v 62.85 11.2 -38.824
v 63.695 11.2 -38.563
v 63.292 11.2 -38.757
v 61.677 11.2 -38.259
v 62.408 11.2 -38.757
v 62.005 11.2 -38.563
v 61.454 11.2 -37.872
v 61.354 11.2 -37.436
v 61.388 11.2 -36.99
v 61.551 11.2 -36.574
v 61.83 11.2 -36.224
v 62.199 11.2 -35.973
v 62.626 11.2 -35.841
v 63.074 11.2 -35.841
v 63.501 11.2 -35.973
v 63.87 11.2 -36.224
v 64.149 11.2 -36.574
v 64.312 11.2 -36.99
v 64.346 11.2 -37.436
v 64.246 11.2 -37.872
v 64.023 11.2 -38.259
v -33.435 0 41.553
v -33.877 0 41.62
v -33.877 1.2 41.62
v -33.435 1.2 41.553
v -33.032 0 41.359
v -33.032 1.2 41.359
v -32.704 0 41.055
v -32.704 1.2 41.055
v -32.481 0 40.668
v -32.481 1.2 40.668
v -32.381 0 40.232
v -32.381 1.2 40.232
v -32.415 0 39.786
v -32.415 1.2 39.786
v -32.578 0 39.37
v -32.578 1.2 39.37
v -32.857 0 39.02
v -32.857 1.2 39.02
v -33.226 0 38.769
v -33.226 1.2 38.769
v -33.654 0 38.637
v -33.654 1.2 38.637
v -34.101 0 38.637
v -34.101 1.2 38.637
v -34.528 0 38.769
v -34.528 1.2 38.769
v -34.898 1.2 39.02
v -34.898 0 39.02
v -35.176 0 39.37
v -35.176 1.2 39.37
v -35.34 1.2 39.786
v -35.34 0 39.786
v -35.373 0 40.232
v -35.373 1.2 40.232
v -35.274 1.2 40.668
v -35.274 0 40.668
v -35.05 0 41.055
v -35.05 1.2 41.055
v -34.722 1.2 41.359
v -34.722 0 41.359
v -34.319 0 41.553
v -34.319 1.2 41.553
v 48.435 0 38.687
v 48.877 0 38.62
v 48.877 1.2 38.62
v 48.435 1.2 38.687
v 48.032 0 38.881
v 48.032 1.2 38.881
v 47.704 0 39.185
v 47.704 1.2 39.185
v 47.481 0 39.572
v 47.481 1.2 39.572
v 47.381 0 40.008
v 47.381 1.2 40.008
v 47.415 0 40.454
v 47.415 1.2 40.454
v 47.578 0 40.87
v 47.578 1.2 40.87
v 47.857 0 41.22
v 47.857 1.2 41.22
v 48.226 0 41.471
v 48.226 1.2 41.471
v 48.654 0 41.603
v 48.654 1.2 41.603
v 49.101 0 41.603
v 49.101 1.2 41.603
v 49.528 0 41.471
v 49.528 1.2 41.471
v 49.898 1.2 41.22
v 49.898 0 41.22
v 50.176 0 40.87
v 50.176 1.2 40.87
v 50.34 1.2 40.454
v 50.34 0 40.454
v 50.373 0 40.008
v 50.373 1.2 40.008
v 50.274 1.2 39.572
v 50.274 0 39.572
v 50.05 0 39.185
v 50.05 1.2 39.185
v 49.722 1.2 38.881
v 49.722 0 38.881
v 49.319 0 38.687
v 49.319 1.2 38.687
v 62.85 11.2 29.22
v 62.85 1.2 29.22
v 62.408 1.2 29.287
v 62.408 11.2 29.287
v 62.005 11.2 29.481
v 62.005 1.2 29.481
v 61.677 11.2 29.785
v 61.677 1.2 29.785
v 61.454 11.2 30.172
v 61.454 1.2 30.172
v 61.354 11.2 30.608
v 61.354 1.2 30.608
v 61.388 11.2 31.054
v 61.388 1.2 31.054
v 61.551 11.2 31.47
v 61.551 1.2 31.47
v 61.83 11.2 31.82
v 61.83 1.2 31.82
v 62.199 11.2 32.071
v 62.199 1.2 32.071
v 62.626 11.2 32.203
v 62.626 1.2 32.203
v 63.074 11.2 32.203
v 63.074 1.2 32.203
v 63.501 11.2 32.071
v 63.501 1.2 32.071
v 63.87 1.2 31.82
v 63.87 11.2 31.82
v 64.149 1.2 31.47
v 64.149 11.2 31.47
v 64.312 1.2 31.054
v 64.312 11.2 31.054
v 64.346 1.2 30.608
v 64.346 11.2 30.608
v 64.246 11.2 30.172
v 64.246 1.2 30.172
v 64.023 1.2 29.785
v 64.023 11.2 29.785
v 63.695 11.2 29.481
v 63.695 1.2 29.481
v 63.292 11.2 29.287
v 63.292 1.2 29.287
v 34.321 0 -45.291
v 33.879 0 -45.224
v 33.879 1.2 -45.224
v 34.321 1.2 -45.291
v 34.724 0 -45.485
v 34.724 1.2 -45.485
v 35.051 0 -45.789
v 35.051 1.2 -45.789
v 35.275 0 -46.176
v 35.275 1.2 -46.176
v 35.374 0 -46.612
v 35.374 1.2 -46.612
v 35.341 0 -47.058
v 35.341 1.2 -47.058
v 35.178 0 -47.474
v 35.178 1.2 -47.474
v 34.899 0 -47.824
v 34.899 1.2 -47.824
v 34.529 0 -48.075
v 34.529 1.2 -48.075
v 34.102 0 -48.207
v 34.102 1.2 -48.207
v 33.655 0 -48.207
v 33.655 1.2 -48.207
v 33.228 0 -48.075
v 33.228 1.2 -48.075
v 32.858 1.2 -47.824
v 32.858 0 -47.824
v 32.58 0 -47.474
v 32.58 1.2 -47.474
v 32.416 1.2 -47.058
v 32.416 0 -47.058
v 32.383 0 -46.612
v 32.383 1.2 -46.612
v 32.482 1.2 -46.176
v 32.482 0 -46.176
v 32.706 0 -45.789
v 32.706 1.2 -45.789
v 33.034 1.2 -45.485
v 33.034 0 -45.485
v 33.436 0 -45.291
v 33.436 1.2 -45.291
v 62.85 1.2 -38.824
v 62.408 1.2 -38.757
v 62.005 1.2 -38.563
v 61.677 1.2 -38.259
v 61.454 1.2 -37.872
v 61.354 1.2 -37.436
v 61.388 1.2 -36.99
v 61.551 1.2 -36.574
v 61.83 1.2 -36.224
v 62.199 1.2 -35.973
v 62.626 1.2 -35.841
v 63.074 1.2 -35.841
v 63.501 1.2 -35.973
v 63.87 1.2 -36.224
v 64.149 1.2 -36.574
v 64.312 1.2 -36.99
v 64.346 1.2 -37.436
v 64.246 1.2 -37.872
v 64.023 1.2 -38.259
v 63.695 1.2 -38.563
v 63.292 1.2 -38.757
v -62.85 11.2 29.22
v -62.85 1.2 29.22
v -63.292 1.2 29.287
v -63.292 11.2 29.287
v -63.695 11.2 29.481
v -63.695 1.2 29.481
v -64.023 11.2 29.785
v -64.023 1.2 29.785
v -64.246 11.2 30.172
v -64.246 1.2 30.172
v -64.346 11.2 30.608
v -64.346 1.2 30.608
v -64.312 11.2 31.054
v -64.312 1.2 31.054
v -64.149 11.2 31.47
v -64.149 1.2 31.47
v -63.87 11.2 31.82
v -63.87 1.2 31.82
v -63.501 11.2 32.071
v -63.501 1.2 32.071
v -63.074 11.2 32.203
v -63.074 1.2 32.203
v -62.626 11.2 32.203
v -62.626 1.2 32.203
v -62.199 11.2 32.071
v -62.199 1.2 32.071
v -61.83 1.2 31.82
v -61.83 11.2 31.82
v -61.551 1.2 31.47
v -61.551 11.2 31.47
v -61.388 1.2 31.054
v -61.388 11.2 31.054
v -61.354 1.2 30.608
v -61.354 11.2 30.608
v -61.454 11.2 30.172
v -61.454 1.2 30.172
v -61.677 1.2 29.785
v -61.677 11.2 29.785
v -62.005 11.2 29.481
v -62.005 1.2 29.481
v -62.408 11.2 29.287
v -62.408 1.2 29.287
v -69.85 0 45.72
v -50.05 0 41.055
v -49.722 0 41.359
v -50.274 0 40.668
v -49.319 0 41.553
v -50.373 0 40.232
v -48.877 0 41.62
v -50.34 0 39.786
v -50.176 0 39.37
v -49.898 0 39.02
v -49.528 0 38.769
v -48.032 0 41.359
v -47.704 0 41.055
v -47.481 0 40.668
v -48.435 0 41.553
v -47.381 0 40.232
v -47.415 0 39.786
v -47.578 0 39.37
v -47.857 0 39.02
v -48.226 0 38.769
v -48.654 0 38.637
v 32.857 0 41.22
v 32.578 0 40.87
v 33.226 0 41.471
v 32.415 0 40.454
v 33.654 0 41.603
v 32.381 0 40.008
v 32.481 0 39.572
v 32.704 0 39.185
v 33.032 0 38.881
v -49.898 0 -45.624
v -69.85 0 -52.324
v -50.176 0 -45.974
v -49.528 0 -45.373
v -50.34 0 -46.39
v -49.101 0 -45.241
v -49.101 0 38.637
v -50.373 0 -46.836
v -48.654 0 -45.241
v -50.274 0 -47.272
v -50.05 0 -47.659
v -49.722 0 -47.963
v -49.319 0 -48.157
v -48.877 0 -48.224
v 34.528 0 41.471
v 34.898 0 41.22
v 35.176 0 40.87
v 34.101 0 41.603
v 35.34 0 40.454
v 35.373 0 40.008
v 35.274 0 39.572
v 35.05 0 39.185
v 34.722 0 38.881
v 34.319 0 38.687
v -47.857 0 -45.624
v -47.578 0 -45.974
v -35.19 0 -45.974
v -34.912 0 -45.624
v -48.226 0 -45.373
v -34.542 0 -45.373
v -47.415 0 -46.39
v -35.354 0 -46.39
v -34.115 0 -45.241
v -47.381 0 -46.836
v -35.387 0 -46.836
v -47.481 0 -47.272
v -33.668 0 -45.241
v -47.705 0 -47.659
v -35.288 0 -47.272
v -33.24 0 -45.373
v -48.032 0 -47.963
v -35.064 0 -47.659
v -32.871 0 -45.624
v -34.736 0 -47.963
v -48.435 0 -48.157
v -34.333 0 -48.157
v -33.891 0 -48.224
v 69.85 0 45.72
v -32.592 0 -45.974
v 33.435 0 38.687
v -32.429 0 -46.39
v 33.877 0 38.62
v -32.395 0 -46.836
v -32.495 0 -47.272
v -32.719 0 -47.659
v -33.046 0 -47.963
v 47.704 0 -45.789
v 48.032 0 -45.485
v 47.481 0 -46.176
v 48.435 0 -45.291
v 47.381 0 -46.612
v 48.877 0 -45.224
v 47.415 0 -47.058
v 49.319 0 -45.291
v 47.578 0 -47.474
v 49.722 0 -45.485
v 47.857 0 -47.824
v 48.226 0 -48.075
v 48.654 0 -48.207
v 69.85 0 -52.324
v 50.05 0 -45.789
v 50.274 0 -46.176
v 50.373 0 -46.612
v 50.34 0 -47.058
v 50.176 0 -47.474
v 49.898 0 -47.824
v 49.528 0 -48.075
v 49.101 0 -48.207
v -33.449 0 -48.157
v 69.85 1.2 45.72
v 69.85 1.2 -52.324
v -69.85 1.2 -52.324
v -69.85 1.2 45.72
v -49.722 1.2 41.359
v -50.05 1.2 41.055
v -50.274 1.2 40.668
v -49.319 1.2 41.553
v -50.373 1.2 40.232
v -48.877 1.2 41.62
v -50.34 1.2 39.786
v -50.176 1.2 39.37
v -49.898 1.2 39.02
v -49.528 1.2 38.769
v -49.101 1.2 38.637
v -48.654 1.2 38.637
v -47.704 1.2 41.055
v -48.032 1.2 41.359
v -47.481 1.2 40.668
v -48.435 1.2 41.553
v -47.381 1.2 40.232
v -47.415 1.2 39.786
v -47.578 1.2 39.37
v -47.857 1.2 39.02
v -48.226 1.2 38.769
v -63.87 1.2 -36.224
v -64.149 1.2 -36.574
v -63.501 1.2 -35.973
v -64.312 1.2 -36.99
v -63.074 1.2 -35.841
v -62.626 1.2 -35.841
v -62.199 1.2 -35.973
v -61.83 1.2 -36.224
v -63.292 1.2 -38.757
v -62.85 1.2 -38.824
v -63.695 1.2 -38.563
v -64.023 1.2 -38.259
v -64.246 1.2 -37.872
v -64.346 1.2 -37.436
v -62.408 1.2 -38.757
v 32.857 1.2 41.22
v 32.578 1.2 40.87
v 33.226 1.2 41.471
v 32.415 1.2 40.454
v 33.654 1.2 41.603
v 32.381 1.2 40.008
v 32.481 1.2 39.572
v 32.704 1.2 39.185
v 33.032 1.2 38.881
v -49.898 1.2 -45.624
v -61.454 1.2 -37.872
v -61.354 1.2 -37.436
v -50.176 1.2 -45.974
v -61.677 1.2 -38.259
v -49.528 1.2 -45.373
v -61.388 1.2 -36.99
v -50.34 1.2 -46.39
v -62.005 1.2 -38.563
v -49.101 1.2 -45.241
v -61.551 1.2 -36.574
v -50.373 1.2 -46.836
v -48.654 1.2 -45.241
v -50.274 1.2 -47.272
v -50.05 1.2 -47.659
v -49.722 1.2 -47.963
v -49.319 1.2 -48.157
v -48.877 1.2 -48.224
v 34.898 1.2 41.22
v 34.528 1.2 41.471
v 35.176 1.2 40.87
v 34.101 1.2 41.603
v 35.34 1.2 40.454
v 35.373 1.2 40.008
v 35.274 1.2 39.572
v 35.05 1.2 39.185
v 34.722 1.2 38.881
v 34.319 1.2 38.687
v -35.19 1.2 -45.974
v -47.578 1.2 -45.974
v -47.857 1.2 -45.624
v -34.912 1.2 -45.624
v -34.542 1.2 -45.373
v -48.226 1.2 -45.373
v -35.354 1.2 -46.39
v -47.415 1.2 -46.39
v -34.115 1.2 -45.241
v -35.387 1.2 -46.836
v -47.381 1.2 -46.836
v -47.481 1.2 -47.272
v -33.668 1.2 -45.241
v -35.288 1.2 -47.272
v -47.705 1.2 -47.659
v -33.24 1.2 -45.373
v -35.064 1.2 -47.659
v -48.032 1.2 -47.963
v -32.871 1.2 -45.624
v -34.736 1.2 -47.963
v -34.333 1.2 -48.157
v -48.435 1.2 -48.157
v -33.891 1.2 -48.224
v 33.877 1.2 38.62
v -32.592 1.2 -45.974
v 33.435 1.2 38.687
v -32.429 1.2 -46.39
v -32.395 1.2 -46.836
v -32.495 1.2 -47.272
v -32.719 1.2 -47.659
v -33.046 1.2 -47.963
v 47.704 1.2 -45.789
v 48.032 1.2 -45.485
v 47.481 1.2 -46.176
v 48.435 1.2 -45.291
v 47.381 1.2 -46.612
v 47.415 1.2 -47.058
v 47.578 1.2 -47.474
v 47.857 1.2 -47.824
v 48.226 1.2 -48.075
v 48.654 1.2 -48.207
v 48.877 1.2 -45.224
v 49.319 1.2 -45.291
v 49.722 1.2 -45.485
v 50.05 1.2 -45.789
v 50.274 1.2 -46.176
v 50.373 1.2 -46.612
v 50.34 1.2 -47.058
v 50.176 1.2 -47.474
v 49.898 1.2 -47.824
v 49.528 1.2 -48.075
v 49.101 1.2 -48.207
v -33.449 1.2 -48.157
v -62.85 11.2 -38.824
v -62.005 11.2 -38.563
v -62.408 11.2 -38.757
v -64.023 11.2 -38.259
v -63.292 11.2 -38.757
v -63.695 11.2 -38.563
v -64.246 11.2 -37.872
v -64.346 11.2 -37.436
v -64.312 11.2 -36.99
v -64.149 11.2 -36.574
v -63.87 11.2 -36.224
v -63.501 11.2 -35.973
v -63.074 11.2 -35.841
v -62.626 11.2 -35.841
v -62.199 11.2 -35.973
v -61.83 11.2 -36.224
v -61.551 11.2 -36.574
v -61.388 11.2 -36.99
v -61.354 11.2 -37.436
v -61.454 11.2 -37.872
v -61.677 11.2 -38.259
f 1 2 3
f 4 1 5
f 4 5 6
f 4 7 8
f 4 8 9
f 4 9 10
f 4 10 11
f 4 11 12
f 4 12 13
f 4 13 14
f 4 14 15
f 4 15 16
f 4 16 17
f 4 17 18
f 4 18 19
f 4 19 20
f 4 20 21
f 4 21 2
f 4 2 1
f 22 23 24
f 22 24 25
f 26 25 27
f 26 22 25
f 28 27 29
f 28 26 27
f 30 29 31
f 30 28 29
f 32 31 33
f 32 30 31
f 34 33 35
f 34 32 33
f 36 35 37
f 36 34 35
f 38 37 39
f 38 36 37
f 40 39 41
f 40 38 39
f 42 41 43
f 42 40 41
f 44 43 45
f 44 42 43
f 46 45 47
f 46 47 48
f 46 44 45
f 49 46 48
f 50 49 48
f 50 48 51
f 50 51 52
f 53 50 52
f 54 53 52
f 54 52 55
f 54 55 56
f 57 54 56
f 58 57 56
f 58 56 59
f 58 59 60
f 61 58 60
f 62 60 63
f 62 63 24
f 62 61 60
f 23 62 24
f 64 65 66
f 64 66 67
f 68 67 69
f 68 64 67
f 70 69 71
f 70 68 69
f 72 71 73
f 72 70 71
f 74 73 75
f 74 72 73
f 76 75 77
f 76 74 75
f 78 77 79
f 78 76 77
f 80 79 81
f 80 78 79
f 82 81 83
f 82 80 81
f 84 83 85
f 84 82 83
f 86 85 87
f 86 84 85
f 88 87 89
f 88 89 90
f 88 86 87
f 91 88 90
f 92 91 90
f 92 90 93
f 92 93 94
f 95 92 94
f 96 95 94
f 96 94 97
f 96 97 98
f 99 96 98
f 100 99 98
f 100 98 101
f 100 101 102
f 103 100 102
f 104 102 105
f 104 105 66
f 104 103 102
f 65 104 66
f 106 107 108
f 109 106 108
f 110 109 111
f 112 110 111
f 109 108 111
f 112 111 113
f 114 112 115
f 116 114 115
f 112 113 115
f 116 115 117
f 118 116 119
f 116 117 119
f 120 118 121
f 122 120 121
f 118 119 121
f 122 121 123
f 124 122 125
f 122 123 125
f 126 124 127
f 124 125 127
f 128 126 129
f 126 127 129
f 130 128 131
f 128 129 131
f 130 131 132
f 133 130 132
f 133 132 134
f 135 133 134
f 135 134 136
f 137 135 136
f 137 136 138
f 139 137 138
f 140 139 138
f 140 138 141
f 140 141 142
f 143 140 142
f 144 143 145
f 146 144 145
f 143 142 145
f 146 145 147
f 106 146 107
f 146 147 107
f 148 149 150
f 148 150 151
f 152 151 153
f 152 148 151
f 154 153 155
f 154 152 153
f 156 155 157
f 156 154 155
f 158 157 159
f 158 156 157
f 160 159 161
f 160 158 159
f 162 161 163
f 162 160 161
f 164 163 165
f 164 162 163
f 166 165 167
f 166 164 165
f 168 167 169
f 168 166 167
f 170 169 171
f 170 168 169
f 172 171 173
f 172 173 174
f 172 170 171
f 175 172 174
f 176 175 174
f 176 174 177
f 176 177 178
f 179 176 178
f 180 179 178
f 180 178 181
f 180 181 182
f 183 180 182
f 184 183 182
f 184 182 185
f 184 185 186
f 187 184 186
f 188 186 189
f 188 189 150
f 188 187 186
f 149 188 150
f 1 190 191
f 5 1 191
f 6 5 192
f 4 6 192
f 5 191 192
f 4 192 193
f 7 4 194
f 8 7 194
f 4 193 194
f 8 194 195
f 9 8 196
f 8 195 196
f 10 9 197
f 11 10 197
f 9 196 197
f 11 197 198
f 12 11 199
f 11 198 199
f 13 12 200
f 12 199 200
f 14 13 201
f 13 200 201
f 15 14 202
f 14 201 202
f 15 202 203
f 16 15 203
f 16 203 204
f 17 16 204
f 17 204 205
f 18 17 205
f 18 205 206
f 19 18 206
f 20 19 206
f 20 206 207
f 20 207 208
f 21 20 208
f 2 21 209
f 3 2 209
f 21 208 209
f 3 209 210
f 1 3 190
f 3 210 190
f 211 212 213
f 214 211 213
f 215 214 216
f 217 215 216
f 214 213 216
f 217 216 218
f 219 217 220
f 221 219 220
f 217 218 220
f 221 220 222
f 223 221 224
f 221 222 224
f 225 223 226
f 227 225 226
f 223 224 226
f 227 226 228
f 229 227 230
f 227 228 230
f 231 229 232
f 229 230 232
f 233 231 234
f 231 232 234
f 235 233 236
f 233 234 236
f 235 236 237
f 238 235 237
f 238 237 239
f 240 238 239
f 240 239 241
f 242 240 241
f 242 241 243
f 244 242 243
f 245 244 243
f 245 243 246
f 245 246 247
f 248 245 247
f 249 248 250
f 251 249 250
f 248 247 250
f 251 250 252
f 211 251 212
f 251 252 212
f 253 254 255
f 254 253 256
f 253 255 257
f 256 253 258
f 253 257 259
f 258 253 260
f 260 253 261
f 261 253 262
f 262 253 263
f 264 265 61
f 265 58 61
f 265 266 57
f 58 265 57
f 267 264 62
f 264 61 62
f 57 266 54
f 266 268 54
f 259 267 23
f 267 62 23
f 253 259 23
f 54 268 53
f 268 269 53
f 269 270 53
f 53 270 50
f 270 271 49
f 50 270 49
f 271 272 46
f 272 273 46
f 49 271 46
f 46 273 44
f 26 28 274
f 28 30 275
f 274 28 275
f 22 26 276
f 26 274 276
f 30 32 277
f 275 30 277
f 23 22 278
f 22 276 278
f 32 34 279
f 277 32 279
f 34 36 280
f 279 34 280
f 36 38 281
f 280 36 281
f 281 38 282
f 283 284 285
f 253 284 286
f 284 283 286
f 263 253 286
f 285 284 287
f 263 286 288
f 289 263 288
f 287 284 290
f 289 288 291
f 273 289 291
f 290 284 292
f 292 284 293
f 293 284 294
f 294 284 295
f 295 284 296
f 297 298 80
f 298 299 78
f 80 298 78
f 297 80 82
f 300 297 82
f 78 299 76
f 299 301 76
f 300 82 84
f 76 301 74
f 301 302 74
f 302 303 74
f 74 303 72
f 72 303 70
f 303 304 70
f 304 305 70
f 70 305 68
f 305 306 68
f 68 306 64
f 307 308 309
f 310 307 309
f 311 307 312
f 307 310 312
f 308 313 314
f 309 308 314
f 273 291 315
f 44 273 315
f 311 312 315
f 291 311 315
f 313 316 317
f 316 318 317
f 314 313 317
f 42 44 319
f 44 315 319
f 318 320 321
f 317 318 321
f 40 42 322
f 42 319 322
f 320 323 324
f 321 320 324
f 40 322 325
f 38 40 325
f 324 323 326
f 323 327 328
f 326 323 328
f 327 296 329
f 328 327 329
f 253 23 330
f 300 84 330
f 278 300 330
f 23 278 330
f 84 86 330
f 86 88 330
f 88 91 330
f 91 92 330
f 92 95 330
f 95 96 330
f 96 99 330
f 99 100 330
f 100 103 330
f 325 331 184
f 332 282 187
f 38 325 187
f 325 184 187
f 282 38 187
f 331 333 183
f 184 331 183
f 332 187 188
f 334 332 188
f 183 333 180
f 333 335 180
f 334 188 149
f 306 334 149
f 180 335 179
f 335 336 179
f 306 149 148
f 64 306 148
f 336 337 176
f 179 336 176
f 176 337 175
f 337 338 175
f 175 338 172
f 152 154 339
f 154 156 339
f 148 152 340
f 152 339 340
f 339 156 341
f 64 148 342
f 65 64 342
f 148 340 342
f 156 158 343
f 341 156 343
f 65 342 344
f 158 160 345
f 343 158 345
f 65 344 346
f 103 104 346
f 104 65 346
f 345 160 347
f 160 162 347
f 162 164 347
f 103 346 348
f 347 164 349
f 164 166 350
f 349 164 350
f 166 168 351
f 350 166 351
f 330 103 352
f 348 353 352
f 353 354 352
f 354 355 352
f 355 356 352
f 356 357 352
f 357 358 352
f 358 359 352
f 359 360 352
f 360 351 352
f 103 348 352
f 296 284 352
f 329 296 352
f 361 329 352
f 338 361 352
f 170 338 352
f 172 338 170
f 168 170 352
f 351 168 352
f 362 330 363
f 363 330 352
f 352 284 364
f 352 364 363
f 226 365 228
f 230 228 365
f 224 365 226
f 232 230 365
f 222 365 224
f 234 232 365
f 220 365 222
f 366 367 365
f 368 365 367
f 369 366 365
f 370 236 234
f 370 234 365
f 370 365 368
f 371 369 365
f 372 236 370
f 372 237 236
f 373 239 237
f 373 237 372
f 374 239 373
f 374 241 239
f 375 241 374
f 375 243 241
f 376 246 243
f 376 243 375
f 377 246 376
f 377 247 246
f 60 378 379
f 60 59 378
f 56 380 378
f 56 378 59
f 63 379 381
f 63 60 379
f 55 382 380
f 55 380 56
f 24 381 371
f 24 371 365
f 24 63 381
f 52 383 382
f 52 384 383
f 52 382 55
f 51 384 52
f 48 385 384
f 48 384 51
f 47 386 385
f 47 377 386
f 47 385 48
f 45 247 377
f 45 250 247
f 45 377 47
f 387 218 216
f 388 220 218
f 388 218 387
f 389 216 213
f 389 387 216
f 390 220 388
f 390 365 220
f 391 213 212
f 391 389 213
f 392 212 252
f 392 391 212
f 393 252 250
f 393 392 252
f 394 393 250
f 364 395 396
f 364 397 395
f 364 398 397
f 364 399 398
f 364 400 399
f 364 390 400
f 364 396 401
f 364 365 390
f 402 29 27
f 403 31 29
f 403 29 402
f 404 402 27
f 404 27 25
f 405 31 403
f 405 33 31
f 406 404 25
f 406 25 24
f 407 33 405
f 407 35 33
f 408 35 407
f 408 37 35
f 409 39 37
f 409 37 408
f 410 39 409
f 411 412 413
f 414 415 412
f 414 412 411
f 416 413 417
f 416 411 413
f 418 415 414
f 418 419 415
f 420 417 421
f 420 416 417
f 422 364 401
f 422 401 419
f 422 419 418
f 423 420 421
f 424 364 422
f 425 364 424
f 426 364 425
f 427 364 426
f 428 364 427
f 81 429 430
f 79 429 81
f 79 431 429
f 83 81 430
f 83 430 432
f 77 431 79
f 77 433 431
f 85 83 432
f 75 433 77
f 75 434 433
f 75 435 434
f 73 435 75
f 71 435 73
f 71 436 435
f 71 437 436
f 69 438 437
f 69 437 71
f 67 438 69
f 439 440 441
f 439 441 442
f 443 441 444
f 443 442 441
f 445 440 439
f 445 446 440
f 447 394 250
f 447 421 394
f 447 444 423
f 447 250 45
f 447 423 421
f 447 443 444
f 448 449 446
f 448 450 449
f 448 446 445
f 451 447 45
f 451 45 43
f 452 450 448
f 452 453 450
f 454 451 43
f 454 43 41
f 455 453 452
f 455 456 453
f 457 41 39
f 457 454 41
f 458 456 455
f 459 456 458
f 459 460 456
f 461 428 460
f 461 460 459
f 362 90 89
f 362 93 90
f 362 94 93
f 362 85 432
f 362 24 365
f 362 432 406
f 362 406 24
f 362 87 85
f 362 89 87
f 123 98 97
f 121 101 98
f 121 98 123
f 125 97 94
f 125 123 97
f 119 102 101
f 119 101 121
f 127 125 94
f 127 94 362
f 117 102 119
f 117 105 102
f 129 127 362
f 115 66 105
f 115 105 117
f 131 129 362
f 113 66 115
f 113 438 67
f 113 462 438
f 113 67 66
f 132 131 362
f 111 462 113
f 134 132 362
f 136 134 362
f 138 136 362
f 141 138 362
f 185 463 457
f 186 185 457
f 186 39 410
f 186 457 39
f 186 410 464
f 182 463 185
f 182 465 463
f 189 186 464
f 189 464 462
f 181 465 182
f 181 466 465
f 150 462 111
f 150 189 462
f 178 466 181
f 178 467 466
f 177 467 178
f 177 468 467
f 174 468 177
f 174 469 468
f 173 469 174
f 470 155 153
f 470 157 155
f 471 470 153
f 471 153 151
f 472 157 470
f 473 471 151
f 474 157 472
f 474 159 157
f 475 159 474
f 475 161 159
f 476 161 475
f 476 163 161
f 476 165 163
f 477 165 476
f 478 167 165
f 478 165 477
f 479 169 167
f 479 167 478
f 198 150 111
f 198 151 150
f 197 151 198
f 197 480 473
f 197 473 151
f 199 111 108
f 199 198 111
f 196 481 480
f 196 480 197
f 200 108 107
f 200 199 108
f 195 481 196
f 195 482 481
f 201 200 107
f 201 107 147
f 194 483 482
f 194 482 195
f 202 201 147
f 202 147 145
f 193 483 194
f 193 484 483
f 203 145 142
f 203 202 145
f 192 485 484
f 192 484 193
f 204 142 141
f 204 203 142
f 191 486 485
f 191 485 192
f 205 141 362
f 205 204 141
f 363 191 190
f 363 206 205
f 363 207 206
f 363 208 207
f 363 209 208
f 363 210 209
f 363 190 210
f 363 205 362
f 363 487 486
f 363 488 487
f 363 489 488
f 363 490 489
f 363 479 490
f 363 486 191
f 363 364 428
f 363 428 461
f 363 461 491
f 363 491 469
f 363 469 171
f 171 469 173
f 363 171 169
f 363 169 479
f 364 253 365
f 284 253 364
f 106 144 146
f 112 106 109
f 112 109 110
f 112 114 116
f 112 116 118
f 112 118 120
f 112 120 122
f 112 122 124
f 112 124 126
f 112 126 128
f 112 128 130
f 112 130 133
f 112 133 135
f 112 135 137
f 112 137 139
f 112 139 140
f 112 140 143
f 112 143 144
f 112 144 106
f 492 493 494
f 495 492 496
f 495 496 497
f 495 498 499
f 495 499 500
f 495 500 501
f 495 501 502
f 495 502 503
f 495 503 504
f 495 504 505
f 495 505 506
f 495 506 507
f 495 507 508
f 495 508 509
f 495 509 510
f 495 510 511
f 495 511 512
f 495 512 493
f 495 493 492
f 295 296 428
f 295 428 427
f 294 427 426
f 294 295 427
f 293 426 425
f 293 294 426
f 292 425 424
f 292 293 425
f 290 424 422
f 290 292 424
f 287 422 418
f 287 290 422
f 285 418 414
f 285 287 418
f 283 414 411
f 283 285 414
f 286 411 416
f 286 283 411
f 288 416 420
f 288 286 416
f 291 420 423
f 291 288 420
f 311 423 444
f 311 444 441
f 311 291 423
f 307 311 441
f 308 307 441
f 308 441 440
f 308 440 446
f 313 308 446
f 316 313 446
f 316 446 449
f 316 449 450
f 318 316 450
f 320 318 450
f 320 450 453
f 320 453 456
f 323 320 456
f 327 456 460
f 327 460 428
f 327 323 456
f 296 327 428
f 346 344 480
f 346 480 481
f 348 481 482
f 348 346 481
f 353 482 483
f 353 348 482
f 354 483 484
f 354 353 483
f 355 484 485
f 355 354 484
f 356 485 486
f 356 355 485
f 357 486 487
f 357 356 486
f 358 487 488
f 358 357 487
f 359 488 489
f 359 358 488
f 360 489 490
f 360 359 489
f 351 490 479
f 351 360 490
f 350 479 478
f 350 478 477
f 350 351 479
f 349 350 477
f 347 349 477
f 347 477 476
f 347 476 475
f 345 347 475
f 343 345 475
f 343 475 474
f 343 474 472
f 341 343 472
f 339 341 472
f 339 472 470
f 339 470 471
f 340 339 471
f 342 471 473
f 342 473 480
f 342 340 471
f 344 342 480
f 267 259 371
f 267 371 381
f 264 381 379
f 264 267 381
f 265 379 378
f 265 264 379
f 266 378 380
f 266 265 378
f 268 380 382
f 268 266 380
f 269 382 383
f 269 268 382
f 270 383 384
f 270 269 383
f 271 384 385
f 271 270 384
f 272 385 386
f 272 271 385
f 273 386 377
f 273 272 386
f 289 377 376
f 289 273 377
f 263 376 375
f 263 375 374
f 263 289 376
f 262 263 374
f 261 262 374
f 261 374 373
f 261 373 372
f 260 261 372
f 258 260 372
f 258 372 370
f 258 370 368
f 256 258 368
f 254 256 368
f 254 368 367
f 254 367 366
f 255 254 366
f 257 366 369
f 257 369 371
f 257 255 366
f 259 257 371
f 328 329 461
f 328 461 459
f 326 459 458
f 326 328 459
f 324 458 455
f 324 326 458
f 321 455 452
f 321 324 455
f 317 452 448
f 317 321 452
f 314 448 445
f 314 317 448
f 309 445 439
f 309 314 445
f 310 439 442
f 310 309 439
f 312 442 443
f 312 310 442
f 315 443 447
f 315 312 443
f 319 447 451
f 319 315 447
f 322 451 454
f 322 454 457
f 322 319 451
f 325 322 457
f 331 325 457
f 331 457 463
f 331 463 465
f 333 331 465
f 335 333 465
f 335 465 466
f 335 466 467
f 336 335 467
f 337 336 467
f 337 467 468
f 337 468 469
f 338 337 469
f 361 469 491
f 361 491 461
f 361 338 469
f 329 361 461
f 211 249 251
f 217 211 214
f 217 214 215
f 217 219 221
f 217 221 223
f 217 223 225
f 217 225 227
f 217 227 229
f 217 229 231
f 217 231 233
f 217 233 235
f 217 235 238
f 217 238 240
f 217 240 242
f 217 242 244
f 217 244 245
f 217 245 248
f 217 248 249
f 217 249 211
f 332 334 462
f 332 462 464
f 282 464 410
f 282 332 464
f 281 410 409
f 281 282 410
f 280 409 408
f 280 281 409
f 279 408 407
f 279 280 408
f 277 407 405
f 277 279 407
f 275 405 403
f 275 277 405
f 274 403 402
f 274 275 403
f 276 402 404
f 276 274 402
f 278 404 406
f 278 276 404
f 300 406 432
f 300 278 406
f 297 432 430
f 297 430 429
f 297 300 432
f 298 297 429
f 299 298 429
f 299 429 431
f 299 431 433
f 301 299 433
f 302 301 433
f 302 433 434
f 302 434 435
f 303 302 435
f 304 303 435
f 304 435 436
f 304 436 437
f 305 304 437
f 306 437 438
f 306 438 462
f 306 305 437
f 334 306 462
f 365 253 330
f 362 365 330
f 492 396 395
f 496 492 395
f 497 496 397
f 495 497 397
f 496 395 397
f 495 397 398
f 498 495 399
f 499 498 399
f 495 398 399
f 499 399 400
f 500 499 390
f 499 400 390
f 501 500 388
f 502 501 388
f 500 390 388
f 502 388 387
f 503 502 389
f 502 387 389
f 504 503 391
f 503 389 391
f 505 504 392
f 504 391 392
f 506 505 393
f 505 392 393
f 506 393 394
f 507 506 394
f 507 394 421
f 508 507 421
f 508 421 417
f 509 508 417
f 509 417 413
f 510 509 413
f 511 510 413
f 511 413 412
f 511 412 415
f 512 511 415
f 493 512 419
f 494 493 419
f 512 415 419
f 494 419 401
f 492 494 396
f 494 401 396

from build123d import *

# Parameters (mm, degrees)
SKETCH1_W           = 139.7
SKETCH1_H           = 98.044
SKETCH1_R           = 1.5
BOSS_EXTRUDE1_DEPTH = 1.2
SKETCH2_R           = 1.5
BOSS_EXTRUDE2_DEPTH = 10


with BuildPart() as part:
    # Sketch1 → Boss-Extrude1 (new body)
    with BuildSketch(Plane(origin=(0, 0, 0), x_dir=(1, 0, 0), z_dir=(0, 1, 0))):
        with Locations((0, 3.302)):
            Rectangle(SKETCH1_W, SKETCH1_H)
        with Locations(Location((-48.8772454, -40.12, 0), (0, 0, 270))):
            Circle(SKETCH1_R, mode=Mode.SUBTRACT)
        with Locations(Location((-33.8772454, -40.12, 0), (0, 0, 270))):
            Circle(SKETCH1_R, mode=Mode.SUBTRACT)
        with Locations(Location((-33.891248194, 46.724, 0), (0, 0, 90))):
            Circle(SKETCH1_R, mode=Mode.SUBTRACT)
        with Locations(Location((-48.877248194, 46.724, 0), (0, 0, 90))):
            Circle(SKETCH1_R, mode=Mode.SUBTRACT)
        with Locations(Location((33.878607802, 46.724, 0), (0, 0, 270))):
            Circle(SKETCH1_R, mode=Mode.SUBTRACT)
        with Locations(Location((48.8772454, 46.724, 0), (0, 0, 270))):
            Circle(SKETCH1_R, mode=Mode.SUBTRACT)
        with Locations(Location((33.8772454, -40.12, 0), (0, 0, 90))):
            Circle(SKETCH1_R, mode=Mode.SUBTRACT)
        with Locations(Location((48.8772454, -40.12, 0), (0, 0, 90))):
            Circle(SKETCH1_R, mode=Mode.SUBTRACT)
    extrude(amount=BOSS_EXTRUDE1_DEPTH)

    # Sketch2 → Boss-Extrude2 (add)
    with BuildSketch(Plane(origin=(0, 1.2, 0), x_dir=(1, 0, 0), z_dir=(0, 1, 0))):
        with Locations(Location((-62.85, 37.324, 0), (0, 0, 90))):
            Circle(SKETCH2_R)
        with Locations(Location((-62.85, -30.72, 0), (0, 0, 90))):
            Circle(SKETCH2_R)
        with Locations(Location((62.85, -30.72, 0), (0, 0, 90))):
            Circle(SKETCH2_R)
        with Locations(Location((62.85, 37.324, 0), (0, 0, 90))):
            Circle(SKETCH2_R)
    extrude(amount=BOSS_EXTRUDE2_DEPTH)


solid = part.part
